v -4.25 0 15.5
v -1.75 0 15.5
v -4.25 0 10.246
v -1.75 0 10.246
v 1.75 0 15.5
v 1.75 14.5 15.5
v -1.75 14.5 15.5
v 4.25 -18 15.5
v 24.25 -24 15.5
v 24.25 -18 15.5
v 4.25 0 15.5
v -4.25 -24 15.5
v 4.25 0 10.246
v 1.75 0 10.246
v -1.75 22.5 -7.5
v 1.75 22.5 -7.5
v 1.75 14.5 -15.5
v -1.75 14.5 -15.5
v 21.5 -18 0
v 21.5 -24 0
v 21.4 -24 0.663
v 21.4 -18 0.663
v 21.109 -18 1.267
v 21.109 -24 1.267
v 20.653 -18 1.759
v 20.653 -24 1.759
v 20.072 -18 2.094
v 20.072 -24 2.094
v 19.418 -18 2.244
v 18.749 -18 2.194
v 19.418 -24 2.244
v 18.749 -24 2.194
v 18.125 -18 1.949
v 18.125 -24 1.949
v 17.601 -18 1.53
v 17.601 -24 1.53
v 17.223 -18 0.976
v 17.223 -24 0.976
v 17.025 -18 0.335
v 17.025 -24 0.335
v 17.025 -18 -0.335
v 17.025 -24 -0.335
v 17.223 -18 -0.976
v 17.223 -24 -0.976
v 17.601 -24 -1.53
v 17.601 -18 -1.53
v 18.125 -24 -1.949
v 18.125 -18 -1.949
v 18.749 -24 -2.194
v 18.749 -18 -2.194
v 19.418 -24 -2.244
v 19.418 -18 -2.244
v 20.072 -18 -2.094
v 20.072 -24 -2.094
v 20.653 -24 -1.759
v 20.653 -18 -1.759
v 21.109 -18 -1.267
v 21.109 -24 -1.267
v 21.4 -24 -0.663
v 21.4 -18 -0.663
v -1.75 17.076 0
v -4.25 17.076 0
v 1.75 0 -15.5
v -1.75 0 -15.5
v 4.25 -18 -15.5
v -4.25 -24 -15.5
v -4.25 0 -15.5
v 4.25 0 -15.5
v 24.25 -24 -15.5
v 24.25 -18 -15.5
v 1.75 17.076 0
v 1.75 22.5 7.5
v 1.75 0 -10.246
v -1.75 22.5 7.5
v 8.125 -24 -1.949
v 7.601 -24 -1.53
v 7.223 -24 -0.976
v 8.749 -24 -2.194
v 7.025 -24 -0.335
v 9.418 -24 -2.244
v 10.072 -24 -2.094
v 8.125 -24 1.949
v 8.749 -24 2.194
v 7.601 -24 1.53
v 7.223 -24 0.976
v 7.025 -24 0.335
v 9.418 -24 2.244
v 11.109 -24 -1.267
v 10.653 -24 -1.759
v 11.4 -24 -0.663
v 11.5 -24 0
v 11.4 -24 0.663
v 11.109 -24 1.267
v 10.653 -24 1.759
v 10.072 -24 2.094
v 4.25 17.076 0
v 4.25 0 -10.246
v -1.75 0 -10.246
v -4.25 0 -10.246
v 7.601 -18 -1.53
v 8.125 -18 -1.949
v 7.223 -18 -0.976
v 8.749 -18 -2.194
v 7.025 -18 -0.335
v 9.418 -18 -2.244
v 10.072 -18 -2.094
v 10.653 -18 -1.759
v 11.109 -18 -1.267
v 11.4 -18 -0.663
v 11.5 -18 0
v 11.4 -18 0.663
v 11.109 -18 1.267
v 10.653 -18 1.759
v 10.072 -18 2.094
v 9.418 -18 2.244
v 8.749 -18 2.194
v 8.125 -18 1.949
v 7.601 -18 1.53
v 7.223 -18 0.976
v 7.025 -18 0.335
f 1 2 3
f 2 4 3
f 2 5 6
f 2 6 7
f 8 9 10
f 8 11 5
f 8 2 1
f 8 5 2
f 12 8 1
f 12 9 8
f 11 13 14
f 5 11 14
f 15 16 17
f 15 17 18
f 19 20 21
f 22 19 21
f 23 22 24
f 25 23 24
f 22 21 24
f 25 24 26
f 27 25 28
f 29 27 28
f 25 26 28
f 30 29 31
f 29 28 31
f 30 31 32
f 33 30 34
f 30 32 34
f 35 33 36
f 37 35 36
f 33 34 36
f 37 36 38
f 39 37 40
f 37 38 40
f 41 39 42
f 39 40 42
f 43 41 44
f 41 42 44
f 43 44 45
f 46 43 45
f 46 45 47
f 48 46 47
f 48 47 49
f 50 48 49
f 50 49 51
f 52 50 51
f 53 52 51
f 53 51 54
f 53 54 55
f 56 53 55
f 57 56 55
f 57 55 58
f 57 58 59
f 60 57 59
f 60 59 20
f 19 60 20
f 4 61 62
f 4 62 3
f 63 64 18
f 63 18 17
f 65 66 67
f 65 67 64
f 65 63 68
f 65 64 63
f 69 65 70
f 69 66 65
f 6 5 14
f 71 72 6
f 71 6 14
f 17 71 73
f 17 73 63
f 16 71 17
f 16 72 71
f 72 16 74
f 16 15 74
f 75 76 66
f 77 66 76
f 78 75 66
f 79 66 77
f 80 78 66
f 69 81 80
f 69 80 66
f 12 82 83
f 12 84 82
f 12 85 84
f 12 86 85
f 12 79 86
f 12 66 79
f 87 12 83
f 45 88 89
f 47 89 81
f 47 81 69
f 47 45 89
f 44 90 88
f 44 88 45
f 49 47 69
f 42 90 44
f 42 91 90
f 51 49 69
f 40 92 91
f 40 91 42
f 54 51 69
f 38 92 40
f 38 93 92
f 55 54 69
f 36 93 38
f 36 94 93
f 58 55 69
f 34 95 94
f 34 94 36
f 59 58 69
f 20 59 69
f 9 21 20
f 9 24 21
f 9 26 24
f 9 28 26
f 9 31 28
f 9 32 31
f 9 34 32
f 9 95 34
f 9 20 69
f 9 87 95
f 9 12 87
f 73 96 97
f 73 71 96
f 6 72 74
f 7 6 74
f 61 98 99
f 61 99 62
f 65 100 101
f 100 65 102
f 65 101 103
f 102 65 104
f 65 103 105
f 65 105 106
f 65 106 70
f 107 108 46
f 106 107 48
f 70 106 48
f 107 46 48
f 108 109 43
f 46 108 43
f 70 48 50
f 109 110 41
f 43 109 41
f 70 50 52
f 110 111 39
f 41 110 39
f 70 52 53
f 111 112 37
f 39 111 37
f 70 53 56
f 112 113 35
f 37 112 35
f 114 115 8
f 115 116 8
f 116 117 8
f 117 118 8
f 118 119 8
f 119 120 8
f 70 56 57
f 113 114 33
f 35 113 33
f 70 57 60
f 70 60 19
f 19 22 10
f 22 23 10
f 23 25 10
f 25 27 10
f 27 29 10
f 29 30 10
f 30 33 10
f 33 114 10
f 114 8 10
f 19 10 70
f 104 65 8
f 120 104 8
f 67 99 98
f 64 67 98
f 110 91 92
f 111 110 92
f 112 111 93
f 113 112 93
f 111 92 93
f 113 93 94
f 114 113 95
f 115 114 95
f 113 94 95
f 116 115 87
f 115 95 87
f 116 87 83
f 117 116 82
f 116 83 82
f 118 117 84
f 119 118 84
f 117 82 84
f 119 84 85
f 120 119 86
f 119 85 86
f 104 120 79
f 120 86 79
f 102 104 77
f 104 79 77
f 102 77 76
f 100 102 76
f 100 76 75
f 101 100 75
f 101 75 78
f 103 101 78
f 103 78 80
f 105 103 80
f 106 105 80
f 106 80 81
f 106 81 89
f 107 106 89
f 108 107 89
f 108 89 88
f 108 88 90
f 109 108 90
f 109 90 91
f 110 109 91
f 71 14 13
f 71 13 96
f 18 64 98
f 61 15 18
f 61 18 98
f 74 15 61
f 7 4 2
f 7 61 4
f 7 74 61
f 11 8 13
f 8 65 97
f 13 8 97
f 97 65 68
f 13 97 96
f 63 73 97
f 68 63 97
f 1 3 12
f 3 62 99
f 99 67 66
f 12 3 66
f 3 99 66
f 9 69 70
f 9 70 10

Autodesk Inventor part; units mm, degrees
ref_plane "YZ Plane" through (0, 0, 0) normal (1, 0, 0) x (0, 1, 0)
ref_plane "XZ Plane" through (0, 0, 0) normal (0, 1, 0) x (-1, 0, 0)
ref_plane "XY Plane" through (0, 0, 0) normal (0, 0, 1) x (1, 0, 0)
sketch "Sketch1" plane through (0, 0, 0) normal (1, 0, 0) x (0, 1, 0)
  line L0 (22.5, 15.5) -> (0, 15.5)
  line L1 (0, 15.5) -> (0, -15.5)
  line L2 (0, -15.5) -> (22.5, -15.5)
  line L3 (22.5, -15.5) -> (22.5, 15.5)
  line L4 (0, -21.7) -> (0, 21.7) projected
  point P0 (0, 0)
  point P1 (22.5, 0)
  dimension "d0" = 31
  dimension "d1" = 22.5
extrude "Extrusion1" add sketch "Sketch1" along normal mid plane 3.5
sketch "Sketch2" plane through (1.75, 0, 0) normal (1, 0, 0) x (0, 0, -1)
  line L0 (-10.2455, 0) -> (0, 17.076)
  line L1 (0, 17.076) -> (10.2455, 0)
  line L2 (-15.5, 0) -> (15.5, 0) projected
  point P0 (0, 0)
  dimension "d31" = 20.491
  dimension "d33" = 17.076
extrude "Extrusion4" add sketch "Sketch2" along normal blind 2.5
mirror "Mirror2" about plane through (0, 0, 0) normal (1, 0, 0) of "Extrusion4"
sketch "Sketch7" plane through (-1.75, 0, -15.5) normal (0, -1, 0) x (1, 0, 0)
  line L0 (0, 0) -> (3.5, 0) projected
  line L1 (3.5, 5.2545) -> (3.5, 0) projected
  line L2 (3.5, 5.2545) -> (6, 5.2545) projected
  line L3 (6, 25.7455) -> (6, 5.2545) projected
  line L4 (3.5, 25.7455) -> (6, 25.7455) projected
  line L5 (3.5, 31) -> (3.5, 25.7455) projected
  line L6 (0, 31) -> (3.5, 31) projected
  line L7 (0, 25.7455) -> (0, 31) projected
  line L8 (0, 25.7455) -> (-2.5, 25.7455) projected
  line L9 (-2.5, 25.7455) -> (-2.5, 5.2545) projected
  line L10 (0, 5.2545) -> (-2.5, 5.2545) projected
  line L11 (0, 0) -> (0, 5.2545) projected
  point P0 (1.75, 15.5)
extrude "Extrusion5" add sketch "Sketch7" along normal blind 24
sketch "Sketch8" plane through (4.25, 0, -10.2455) normal (0, 0, -1) x (-1, 0, 0)
  line L0 (2.5, 0) -> (0, 0) projected
  line L1 (0, 0) -> (0, -24) projected
  line L2 (2.5, -24) -> (0, -24) projected
  line L3 (2.5, 0) -> (2.5, -24) projected
  point P0 (4.25, 0)
extrude "Extrusion6" add sketch "Sketch8" along normal up to surface (5.2545 mm away)
mirror "Mirror3" about plane through (0, 0, 0) normal (0, 0, 1) of "Extrusion6"
mirror "Mirror4" about plane through (0, 0, 0) normal (1, 0, 0) of "Extrusion6", "Mirror3"
sketch "Sketch9" plane through (4.25, 0, 0) normal (1, 0, 0) x (0, 0, -1)
  line L0 (0, 17.076) -> (-10.2455, 0) construction
  line L1 (0, 17.076) -> (0, -24) construction
  line L2 (-15.5, -24) -> (15.5, -24) construction
  line L3 (-5.1228, 8.538) -> (5.1227, 8.538) construction
  line L4 (0, 17.076) -> (10.2455, 0) construction
  line L5 (-7.5227, 4.538) -> (7.5227, 4.538) construction
  line L6 (-13.5227, -5.462) -> (13.5227, -5.462) construction
  point P0 (0, 0)
  dimension "d40" = 4
  dimension "d50" = 10
chamfer "Chamfer1" distance 8 angle 45 2 edges at (0, 22.5, 15.5) (0, 22.5, -15.5)
sketch "Sketch10" plane through (-1.75, -24, -15.5) normal (0, -1, 0) x (1, 0, 0)
  line L0 (6, 31) -> (6, 0) projected
  line L1 (6, 0) -> (26, 0)
  line L2 (26, 0) -> (26, 31)
  line L3 (26, 31) -> (6, 31)
  line L4 (6, 31) -> (6, 0)
  circle A0 centre (21, 15.5) radius 2.25
  circle A1 centre (11, 15.5) radius 2.25
  line L5 (16, 0) -> (16, 31) construction
  point P0 (1.75, 15.5)
  dimension "d63" = 20
  dimension "d64" = 4.5
  dimension "d65" = 10
extrude "Extrusion7" add sketch "Sketch10" against normal blind 6
properties part number "Traingular Hopper Connector v.2"
